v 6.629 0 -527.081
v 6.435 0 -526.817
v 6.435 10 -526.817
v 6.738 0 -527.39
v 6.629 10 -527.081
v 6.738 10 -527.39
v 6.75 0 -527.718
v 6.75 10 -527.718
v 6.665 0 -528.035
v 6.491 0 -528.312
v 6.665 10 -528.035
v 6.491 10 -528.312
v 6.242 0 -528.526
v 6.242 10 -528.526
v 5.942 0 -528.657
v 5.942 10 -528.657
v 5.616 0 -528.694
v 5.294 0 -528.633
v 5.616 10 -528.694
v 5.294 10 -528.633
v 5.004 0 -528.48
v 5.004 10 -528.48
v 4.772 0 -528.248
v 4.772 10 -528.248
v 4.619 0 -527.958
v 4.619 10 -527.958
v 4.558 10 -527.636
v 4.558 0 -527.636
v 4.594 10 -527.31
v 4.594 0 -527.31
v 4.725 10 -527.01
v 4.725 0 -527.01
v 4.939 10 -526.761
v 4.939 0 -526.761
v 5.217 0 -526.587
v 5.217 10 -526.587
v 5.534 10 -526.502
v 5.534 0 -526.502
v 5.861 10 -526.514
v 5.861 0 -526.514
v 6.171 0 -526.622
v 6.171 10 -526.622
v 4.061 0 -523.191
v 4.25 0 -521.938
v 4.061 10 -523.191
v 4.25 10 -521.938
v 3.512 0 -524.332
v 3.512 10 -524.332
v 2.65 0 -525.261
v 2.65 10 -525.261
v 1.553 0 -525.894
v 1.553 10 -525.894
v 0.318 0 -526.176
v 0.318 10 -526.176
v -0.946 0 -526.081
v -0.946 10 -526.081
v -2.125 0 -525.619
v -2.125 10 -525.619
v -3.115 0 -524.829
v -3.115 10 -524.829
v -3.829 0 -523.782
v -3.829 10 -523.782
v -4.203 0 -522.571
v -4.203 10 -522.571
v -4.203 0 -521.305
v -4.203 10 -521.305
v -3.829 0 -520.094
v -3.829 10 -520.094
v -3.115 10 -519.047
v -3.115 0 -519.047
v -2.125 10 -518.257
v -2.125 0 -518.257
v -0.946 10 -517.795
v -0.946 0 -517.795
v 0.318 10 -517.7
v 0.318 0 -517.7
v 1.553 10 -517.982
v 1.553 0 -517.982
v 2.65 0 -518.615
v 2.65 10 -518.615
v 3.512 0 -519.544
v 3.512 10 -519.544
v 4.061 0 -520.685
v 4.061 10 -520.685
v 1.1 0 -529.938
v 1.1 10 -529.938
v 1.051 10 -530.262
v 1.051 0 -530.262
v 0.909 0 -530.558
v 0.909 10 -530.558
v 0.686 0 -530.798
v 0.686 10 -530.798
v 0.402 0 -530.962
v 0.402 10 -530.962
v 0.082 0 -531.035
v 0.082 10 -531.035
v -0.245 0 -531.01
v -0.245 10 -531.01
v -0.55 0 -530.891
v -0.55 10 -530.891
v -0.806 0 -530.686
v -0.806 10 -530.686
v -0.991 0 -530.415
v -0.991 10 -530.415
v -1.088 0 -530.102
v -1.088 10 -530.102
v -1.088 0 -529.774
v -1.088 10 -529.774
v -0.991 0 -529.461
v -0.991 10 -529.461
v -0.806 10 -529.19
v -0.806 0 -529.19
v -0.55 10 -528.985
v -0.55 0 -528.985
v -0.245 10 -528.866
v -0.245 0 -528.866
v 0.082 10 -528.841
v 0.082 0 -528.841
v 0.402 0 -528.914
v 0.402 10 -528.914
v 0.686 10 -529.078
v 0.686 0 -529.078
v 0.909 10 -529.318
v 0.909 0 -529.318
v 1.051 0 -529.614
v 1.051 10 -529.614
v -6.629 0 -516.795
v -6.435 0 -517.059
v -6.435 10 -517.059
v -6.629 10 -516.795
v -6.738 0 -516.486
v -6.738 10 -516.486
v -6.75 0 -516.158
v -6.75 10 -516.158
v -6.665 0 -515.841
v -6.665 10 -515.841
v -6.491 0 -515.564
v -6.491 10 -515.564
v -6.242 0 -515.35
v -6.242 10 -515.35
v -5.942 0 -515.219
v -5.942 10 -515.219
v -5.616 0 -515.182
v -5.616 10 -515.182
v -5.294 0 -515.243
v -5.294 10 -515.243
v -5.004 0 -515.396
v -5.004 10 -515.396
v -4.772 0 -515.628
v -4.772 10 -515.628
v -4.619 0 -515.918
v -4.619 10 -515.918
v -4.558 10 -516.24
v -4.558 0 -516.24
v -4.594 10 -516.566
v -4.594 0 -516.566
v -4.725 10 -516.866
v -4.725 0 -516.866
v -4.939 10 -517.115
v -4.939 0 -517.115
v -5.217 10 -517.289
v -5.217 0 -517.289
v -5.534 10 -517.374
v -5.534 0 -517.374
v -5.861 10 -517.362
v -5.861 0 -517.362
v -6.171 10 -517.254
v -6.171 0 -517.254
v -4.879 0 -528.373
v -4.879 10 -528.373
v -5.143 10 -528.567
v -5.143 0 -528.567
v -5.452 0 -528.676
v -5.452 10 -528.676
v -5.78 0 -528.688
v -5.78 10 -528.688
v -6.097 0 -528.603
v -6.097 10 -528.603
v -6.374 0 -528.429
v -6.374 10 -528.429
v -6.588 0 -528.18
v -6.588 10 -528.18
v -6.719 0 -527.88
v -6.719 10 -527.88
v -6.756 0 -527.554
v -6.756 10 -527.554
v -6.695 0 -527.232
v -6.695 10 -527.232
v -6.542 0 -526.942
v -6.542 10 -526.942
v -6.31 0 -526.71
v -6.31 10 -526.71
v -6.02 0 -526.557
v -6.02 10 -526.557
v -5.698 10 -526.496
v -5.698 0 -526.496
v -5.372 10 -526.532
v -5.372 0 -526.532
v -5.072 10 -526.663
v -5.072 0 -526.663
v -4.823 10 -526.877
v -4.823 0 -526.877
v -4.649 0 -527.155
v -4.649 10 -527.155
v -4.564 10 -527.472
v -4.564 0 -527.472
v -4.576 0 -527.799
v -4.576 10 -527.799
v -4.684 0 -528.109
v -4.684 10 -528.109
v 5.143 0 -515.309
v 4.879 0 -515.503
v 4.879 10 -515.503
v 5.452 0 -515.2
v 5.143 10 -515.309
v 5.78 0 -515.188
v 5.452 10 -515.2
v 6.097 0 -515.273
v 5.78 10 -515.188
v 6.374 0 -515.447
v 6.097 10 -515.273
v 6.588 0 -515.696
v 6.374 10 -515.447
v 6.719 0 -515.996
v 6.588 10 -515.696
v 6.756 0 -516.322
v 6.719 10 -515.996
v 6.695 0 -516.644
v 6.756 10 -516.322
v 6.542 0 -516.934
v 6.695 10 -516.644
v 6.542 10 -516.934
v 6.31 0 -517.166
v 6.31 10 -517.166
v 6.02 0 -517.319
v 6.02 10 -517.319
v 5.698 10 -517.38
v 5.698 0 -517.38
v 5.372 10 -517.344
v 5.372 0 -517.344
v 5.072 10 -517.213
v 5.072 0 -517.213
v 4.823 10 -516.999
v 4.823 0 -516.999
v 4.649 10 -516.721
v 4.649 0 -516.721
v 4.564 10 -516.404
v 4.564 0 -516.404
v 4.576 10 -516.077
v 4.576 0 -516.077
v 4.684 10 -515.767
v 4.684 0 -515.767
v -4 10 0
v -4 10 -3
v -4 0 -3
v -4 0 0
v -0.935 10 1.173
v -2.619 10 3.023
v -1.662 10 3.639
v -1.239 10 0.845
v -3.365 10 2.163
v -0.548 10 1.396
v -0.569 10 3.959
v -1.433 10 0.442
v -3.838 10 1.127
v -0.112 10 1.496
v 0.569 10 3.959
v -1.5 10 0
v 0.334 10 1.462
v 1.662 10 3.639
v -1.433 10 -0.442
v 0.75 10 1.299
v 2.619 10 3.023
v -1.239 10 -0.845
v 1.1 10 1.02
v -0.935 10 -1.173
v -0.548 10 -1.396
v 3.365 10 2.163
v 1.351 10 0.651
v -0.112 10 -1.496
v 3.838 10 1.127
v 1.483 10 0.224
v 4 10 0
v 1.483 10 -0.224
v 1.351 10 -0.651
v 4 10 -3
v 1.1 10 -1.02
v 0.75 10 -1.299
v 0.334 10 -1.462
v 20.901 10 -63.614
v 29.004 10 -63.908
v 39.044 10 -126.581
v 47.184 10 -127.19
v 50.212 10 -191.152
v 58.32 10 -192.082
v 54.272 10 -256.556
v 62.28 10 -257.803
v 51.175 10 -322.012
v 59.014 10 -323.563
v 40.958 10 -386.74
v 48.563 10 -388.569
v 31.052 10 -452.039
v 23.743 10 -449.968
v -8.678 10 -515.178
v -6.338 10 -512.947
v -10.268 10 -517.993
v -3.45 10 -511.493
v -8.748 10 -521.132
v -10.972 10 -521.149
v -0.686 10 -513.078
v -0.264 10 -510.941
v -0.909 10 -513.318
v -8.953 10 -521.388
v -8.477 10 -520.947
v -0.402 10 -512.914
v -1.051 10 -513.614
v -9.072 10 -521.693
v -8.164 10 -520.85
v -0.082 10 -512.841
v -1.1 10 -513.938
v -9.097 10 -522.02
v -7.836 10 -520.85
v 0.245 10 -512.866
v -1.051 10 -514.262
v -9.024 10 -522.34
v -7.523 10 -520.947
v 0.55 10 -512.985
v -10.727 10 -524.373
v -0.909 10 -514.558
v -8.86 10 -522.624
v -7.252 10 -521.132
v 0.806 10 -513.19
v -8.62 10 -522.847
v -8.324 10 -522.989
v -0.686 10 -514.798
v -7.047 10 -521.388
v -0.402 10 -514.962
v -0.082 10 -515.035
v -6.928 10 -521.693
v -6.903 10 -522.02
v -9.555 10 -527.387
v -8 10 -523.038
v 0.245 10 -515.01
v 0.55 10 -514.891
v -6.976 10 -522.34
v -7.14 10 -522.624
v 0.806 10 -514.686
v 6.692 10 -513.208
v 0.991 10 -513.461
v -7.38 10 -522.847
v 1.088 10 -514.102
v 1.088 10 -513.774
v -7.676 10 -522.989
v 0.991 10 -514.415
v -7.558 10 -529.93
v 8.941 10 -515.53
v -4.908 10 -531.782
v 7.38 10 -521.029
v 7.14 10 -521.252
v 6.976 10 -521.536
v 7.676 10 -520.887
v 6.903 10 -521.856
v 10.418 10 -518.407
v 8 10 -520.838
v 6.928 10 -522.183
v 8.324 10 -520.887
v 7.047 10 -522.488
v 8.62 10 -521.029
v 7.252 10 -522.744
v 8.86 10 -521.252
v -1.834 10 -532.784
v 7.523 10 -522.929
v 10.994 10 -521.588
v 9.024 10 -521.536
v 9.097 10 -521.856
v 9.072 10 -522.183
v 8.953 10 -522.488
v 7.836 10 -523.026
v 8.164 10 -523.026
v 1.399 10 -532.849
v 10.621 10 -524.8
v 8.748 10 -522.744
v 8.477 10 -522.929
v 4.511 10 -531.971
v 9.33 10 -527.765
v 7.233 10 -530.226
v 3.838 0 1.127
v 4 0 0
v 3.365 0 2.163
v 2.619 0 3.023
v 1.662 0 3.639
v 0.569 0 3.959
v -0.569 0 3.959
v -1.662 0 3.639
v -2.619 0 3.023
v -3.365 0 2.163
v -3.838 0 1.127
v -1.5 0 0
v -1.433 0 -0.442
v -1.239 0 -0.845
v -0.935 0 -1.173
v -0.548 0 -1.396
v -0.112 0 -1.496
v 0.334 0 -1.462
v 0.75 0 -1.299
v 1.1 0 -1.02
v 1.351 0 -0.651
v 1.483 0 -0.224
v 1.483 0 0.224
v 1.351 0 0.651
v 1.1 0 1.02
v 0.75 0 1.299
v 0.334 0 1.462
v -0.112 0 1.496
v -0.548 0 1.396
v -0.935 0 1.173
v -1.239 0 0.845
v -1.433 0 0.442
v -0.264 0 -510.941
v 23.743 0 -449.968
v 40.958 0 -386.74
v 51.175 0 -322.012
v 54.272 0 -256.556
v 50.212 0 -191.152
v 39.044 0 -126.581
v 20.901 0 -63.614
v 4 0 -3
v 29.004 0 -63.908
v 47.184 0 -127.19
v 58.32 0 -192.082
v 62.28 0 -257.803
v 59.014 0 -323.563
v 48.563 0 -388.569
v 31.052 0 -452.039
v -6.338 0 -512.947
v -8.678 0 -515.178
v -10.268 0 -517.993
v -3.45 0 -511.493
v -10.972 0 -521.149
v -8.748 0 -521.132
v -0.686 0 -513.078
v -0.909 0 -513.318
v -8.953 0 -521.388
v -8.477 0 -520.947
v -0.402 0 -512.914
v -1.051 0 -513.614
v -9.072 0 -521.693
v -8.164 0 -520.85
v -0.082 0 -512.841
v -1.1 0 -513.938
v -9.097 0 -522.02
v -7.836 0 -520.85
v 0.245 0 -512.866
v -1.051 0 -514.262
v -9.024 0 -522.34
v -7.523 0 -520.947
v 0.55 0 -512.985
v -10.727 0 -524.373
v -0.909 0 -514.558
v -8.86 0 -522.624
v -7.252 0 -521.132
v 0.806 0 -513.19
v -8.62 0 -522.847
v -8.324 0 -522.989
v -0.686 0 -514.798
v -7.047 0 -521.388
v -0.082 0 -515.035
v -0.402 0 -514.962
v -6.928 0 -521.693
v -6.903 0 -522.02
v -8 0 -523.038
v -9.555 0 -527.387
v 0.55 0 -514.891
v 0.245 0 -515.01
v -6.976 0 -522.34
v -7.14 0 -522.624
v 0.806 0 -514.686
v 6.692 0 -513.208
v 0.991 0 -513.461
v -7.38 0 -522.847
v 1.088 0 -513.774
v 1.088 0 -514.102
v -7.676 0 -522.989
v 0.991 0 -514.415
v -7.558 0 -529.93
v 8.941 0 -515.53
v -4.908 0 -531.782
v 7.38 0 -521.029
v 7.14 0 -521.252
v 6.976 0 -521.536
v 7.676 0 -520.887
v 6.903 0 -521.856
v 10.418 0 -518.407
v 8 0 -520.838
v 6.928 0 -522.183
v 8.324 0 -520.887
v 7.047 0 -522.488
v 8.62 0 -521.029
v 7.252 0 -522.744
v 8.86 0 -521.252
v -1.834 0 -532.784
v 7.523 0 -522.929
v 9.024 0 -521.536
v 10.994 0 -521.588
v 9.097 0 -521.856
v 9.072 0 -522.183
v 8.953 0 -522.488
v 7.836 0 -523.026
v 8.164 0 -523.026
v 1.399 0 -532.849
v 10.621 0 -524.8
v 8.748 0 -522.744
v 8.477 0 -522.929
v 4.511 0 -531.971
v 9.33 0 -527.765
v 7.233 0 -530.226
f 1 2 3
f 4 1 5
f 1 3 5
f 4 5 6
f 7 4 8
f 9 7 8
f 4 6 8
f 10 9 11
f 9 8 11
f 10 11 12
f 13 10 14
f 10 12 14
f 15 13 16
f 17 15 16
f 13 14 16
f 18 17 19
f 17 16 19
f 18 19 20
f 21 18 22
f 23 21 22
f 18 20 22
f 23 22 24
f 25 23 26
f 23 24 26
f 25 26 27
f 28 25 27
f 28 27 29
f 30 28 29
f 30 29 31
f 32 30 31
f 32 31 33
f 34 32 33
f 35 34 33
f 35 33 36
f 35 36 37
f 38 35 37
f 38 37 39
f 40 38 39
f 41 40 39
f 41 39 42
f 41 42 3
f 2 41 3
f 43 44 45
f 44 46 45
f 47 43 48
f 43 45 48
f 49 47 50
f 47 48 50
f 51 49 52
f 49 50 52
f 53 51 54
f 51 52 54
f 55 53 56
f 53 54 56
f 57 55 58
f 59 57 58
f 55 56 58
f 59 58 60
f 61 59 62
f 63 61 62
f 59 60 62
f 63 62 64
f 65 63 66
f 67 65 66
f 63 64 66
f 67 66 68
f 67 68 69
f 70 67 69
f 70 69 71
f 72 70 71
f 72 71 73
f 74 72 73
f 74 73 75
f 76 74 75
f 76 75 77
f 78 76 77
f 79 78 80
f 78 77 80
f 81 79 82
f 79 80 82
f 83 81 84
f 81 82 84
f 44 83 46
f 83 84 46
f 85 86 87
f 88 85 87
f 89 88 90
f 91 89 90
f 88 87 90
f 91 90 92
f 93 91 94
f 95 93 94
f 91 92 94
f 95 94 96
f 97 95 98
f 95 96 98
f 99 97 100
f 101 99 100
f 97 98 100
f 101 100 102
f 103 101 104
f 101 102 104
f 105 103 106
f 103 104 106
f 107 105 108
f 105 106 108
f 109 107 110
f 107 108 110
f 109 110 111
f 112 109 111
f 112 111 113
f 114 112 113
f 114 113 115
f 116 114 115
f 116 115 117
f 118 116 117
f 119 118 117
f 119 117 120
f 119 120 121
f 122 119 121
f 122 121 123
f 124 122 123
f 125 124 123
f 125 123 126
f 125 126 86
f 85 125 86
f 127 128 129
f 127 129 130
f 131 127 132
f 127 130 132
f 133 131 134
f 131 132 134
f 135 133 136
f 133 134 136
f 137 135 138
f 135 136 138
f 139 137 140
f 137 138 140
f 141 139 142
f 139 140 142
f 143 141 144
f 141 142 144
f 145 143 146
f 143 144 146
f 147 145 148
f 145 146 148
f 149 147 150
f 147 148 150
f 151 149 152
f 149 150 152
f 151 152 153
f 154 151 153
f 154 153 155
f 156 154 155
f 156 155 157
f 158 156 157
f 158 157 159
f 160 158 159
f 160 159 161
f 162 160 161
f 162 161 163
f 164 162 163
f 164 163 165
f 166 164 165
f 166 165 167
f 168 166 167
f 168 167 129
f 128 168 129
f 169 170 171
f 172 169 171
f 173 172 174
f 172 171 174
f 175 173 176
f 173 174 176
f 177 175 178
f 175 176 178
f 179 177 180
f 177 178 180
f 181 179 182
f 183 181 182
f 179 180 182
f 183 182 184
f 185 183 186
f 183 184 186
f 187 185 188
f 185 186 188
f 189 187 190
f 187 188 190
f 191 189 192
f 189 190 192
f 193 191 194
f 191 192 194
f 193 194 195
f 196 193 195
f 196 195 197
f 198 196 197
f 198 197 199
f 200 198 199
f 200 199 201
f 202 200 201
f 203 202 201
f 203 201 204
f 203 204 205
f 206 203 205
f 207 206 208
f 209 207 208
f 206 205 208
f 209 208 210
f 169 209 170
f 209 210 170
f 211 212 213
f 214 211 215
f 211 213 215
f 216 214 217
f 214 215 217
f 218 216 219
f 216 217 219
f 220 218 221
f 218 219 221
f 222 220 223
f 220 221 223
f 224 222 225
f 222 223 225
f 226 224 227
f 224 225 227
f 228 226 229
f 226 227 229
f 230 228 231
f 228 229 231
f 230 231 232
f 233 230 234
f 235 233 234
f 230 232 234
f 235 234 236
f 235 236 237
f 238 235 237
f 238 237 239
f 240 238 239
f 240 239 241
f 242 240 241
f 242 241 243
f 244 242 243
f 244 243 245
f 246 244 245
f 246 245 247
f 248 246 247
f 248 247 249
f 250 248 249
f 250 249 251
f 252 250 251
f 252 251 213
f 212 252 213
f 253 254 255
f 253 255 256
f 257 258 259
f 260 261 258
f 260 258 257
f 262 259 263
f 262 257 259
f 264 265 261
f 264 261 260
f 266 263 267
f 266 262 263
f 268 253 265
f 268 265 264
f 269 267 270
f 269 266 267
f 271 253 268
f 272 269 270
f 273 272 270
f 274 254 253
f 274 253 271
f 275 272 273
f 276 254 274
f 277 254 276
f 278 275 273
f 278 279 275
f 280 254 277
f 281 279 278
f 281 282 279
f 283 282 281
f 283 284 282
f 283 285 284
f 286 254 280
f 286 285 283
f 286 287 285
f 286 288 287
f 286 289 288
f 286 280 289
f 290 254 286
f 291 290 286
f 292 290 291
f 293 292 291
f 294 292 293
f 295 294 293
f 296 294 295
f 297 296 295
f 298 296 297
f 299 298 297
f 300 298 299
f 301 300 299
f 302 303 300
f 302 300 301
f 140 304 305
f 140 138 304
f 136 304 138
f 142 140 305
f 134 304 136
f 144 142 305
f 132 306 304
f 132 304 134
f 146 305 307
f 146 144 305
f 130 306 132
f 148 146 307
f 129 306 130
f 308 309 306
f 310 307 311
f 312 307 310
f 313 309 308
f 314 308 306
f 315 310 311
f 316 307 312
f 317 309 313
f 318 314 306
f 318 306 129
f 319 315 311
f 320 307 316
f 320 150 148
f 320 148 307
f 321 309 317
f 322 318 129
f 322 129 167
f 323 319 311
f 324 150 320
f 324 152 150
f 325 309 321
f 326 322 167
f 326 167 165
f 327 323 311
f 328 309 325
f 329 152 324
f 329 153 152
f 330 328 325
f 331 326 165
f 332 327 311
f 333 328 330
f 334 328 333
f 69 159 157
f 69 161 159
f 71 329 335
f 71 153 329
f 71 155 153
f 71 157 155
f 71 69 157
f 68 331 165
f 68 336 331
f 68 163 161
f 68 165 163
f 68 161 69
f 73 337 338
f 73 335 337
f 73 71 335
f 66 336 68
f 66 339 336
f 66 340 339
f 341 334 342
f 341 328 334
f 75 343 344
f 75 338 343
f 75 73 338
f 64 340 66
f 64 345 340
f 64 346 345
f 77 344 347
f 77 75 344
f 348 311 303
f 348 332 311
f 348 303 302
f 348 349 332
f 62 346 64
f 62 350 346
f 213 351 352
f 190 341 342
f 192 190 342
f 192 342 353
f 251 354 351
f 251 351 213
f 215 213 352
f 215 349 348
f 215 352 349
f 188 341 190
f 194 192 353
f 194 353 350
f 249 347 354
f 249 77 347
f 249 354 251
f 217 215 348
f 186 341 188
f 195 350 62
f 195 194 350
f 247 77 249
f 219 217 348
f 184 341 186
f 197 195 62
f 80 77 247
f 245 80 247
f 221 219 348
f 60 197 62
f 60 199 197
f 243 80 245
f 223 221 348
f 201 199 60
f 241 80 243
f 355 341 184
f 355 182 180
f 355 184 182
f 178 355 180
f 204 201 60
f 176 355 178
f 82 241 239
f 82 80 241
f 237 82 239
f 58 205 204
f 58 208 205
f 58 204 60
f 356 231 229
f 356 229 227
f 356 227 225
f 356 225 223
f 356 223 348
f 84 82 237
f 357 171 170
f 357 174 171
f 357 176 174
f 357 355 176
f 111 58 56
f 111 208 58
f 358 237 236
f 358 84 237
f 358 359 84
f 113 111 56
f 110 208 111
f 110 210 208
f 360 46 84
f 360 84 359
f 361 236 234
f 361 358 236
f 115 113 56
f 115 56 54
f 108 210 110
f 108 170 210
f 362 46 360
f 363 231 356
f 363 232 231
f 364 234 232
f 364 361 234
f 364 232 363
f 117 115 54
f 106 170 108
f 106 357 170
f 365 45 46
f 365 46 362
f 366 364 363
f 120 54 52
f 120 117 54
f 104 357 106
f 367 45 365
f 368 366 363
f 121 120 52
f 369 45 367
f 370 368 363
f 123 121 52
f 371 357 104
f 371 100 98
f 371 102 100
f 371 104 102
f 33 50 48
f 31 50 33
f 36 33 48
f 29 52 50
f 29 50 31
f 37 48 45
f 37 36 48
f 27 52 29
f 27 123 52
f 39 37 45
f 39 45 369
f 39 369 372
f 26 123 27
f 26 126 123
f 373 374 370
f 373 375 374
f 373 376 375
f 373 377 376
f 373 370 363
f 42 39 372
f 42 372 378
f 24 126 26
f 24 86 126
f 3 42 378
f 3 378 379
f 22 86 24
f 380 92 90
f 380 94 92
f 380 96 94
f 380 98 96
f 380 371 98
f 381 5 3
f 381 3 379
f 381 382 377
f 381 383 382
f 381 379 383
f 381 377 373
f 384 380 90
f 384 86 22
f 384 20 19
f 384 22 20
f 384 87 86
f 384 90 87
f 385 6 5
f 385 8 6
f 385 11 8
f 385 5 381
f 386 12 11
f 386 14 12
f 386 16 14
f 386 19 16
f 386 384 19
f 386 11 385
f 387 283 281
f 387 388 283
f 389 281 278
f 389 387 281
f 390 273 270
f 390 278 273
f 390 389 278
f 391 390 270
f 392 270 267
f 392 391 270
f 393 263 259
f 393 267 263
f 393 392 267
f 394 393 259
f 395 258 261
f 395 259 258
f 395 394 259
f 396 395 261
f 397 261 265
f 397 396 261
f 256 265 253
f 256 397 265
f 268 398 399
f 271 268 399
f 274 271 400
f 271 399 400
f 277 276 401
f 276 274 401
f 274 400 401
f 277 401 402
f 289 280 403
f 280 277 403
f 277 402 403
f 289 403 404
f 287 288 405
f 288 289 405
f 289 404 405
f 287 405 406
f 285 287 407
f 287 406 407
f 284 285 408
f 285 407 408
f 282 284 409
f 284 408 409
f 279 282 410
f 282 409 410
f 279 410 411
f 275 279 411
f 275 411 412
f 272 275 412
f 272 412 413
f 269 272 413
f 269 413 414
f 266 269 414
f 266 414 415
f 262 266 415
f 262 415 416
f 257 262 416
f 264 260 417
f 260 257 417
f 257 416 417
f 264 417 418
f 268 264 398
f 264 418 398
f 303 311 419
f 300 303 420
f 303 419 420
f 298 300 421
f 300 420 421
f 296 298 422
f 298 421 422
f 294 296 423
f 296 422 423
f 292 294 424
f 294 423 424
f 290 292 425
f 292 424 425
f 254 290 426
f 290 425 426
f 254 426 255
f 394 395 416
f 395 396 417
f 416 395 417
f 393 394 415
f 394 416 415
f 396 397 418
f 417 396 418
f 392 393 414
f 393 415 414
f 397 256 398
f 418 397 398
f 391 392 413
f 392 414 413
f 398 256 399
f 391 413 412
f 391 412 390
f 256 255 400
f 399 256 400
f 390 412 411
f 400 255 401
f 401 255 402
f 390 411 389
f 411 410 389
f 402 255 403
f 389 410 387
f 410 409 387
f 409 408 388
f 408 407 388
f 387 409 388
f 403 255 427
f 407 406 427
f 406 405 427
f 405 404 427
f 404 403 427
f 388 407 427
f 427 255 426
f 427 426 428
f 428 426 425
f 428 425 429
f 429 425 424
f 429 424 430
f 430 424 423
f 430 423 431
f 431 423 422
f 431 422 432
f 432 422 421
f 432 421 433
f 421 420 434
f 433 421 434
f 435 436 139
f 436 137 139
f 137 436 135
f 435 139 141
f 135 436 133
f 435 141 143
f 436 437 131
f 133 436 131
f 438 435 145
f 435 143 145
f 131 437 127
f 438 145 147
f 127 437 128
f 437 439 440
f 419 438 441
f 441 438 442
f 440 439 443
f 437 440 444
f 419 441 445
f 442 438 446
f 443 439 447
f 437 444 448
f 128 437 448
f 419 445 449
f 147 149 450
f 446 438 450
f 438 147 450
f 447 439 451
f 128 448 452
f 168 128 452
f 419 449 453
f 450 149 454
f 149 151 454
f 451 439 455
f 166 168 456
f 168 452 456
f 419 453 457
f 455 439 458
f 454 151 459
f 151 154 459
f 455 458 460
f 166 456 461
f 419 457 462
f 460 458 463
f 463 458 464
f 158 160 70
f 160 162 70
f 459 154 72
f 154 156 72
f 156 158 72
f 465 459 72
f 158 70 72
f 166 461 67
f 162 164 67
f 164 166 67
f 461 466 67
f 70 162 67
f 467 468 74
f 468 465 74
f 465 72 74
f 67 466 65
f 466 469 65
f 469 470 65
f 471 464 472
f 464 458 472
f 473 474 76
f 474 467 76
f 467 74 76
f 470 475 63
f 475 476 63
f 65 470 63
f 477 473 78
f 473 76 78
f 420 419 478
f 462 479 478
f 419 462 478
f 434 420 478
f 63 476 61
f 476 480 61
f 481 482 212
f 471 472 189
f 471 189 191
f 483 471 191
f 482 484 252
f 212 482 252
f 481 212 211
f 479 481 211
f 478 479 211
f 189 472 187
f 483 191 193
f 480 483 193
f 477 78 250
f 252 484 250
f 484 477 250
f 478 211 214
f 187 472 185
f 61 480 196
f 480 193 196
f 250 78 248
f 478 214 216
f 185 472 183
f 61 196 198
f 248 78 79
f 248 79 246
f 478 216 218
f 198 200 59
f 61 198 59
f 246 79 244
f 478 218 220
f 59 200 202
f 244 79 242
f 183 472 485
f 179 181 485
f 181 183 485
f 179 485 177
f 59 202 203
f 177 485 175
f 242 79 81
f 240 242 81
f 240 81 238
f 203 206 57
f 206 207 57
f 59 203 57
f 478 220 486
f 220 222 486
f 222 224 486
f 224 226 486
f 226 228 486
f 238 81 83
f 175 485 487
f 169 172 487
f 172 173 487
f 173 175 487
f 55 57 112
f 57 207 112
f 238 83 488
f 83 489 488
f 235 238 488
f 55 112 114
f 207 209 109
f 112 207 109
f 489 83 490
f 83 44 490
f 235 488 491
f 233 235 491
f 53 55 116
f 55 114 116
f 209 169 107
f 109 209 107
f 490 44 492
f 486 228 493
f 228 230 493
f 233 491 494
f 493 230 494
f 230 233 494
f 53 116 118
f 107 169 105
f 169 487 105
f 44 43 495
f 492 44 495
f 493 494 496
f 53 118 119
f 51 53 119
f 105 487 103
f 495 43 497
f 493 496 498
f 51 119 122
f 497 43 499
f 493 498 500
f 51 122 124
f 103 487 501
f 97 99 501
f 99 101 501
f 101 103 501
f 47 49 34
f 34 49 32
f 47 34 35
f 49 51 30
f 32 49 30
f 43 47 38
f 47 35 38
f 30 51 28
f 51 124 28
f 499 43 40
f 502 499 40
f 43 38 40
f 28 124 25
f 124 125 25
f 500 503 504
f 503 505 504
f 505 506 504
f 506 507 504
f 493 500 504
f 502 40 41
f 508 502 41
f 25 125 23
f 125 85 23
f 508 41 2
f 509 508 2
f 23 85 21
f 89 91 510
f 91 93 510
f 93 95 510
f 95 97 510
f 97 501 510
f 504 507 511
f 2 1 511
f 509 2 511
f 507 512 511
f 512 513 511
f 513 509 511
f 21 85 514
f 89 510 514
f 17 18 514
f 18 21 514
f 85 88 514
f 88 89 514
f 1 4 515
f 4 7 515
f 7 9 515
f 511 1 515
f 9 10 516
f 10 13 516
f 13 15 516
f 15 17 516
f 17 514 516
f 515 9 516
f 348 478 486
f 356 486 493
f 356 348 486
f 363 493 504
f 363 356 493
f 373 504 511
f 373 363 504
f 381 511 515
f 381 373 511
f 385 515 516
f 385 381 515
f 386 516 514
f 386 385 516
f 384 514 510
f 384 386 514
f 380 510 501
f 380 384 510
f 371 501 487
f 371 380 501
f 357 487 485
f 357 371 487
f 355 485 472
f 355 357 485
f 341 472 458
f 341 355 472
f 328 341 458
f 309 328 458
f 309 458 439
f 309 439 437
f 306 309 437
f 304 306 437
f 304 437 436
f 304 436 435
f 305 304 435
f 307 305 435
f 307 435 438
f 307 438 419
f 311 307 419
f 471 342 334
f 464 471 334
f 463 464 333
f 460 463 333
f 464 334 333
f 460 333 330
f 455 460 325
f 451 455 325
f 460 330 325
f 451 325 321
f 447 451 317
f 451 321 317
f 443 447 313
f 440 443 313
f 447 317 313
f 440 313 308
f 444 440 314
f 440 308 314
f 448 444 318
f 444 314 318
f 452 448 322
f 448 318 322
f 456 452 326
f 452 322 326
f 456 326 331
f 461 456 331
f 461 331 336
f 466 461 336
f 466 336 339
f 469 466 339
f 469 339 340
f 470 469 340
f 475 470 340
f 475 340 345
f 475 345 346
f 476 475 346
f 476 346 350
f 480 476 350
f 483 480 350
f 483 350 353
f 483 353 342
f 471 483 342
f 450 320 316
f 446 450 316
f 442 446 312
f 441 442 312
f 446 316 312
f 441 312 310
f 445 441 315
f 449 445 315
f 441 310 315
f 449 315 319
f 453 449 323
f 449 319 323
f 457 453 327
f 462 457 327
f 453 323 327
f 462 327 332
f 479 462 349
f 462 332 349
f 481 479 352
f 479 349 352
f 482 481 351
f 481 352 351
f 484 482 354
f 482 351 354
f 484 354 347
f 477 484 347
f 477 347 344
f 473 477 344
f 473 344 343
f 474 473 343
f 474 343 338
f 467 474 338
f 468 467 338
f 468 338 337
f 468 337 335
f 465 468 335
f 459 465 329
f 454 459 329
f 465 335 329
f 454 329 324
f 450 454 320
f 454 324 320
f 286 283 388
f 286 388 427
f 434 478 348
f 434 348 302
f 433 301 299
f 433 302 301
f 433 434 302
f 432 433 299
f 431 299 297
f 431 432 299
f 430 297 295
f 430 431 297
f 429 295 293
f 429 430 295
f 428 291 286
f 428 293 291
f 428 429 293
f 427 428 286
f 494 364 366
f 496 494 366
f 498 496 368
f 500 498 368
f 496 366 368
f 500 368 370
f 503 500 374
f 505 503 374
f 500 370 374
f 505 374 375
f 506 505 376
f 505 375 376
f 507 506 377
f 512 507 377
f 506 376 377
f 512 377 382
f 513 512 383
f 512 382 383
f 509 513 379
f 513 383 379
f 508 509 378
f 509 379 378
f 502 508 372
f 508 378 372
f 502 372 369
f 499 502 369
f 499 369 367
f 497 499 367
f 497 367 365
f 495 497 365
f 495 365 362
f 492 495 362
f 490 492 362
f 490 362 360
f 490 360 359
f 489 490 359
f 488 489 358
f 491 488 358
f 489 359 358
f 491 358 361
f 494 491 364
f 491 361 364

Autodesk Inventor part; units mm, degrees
ref_plane "YZ Plane" through (0, 0, 0) normal (1, 0, 0) x (0, 1, 0)
ref_plane "XZ Plane" through (0, 0, 0) normal (0, 1, 0) x (-1, 0, 0)
ref_plane "XY Plane" through (0, 0, 0) normal (0, 0, 1) x (1, 0, 0)
sketch "Sketch1" plane through (0, 0, 0) normal (0, 1, 0) x (-1, 0, 0)
  line L0 (0, 0) -> (0, -521.938) construction
  line L1 (-4, 0) -> (-4, -521.938)
  line L2 (4, -521.938) -> (4, 0)
  arc A0 (4, 0) -> (-4, 0) centre (0, 0) ccw
  arc A1 (-4, -521.938) -> (4, -521.938) centre (0, -521.938) ccw
  circle A2 centre (0, 0) radius 1.5
  circle A3 centre (0, -521.938) radius 1.5
  arc A4 (-4, -3) -> (-4, -518.938) centre (537.7121, -260.969) ccw
  arc A5 (4, -3) -> (4, -518.938) centre (545.7121, -260.969) ccw
  point P0 (0, -260.969)
  point P1 (-4, -501.4199)
  point P2 (-4, -20.5181)
  dimension "d0" = 8
  dimension "d1" = 521.938
  dimension "d2" = 3
  dimension "d3" = 3
  dimension "d24" = 600
  dimension "d25" = 600
  dimension "d26" = 3
  dimension "d27" = 3
extrude "Extrusion1" add sketch "Sketch1" along normal blind 10 contours A0 L2 A5 L1 | L1 A5 A4 | L1 A5 L2 A1
sketch "Sketch5" plane through (0, 10, 0) normal (0, 1, 0) x (1, 0, 0)
  arc A0 (4, 3) -> (4, 518.938) centre (-537.7121, 260.969) ccw projected
  line L0 (4, 518.938) -> (4, 521.938) projected
  arc A1 (4, 521.938) -> (-4, 521.938) centre (0, 521.938) ccw projected
  line L1 (-4, 521.938) -> (-4, 518.938) projected
  arc A2 (-4, 3) -> (-4, 518.938) centre (-545.7121, 260.969) ccw projected
  line L2 (-4, 3) -> (-4, 0) projected
  arc A3 (-4, 0) -> (4, 0) centre (0, 0) ccw projected
  line L3 (4, 0) -> (4, 3) projected
  circle A4 centre (0, 521.938) radius 1.5 projected
  circle A5 centre (0, 0) radius 1.5 projected
  circle A6 centre (0, 521.938) radius 11
  point P0 (6.6919, 513.2076)
  point P1 (-0.2637, 510.9412)
  dimension "d45" = 22
extrude "Extrusion5" add sketch "Sketch5" against normal blind 10 contours A0 L0 A1 L1 A2 A6 picked at (6.2374, 520.1049)
sketch "Sketch6" plane through (0, 10, 0) normal (0, 1, 0) x (1, 0, 0)
  arc A0 (4, 3) -> (6.6919, 513.2076) centre (-537.7121, 260.969) ccw projected
  arc A1 (6.6919, 513.2076) -> (-0.2637, 510.9412) centre (0, 521.938) ccw projected
  arc A2 (-4, 3) -> (-0.2637, 510.9412) centre (-545.7121, 260.969) ccw projected
  line L0 (-4, 3) -> (-4, 0) projected
  arc A3 (-4, 0) -> (4, 0) centre (0, 0) ccw projected
  line L1 (4, 0) -> (4, 3) projected
  circle A4 centre (0, 521.938) radius 1.5 projected
  circle A5 centre (0, 0) radius 1.5 projected
  circle A6 centre (0, 529.938) radius 1.1
  circle A7 centre (0, 521.938) radius 4.25
  dimension "d48" = 2.2
  dimension "d49" = 8
  dimension "d55" = 8.5
extrude "Extrusion6" cut sketch "Sketch6" against normal blind 100 contours A4 | A6 | A7
pattern_circular "Circular Pattern1" count 8 over 360 about axis through (0, 0, -521.938) along (0, 1, 0) of "Extrusion6"
sketch "Sketch2" plane through (0, 10, 0) normal (0, 1, 0) x (1, 0, 0)
  arc A0 (4, 3) -> (6.6919, 513.2076) centre (-537.7121, 260.969) ccw projected
  arc A1 (-4, 3) -> (-0.2637, 510.9412) centre (-545.7121, 260.969) ccw projected
  line L0 (-4, 3) -> (-4, 0) projected
  arc A2 (-4, 0) -> (4, 0) centre (0, 0) ccw projected
  line L1 (4, 0) -> (4, 3) projected
  circle A3 centre (0, 0) radius 1.5 projected
  arc A4 (-4, 3) -> (-4, 518.938) centre (-545.7121, 260.969) ccw projected
  line L2 (54.2879, 260.969) -> (58.1281, 268.7691)
  line L3 (58.1281, 268.7691) -> (62.2796, 257.8034)
  arc A5 (4, 3) -> (4, 518.938) centre (-537.7121, 260.969) ccw projected
  arc A6 (6.6919, 513.2076) -> (-0.2637, 510.9412) centre (0, 521.938) ccw projected
extrude "Extrusion2" [suppressed]
